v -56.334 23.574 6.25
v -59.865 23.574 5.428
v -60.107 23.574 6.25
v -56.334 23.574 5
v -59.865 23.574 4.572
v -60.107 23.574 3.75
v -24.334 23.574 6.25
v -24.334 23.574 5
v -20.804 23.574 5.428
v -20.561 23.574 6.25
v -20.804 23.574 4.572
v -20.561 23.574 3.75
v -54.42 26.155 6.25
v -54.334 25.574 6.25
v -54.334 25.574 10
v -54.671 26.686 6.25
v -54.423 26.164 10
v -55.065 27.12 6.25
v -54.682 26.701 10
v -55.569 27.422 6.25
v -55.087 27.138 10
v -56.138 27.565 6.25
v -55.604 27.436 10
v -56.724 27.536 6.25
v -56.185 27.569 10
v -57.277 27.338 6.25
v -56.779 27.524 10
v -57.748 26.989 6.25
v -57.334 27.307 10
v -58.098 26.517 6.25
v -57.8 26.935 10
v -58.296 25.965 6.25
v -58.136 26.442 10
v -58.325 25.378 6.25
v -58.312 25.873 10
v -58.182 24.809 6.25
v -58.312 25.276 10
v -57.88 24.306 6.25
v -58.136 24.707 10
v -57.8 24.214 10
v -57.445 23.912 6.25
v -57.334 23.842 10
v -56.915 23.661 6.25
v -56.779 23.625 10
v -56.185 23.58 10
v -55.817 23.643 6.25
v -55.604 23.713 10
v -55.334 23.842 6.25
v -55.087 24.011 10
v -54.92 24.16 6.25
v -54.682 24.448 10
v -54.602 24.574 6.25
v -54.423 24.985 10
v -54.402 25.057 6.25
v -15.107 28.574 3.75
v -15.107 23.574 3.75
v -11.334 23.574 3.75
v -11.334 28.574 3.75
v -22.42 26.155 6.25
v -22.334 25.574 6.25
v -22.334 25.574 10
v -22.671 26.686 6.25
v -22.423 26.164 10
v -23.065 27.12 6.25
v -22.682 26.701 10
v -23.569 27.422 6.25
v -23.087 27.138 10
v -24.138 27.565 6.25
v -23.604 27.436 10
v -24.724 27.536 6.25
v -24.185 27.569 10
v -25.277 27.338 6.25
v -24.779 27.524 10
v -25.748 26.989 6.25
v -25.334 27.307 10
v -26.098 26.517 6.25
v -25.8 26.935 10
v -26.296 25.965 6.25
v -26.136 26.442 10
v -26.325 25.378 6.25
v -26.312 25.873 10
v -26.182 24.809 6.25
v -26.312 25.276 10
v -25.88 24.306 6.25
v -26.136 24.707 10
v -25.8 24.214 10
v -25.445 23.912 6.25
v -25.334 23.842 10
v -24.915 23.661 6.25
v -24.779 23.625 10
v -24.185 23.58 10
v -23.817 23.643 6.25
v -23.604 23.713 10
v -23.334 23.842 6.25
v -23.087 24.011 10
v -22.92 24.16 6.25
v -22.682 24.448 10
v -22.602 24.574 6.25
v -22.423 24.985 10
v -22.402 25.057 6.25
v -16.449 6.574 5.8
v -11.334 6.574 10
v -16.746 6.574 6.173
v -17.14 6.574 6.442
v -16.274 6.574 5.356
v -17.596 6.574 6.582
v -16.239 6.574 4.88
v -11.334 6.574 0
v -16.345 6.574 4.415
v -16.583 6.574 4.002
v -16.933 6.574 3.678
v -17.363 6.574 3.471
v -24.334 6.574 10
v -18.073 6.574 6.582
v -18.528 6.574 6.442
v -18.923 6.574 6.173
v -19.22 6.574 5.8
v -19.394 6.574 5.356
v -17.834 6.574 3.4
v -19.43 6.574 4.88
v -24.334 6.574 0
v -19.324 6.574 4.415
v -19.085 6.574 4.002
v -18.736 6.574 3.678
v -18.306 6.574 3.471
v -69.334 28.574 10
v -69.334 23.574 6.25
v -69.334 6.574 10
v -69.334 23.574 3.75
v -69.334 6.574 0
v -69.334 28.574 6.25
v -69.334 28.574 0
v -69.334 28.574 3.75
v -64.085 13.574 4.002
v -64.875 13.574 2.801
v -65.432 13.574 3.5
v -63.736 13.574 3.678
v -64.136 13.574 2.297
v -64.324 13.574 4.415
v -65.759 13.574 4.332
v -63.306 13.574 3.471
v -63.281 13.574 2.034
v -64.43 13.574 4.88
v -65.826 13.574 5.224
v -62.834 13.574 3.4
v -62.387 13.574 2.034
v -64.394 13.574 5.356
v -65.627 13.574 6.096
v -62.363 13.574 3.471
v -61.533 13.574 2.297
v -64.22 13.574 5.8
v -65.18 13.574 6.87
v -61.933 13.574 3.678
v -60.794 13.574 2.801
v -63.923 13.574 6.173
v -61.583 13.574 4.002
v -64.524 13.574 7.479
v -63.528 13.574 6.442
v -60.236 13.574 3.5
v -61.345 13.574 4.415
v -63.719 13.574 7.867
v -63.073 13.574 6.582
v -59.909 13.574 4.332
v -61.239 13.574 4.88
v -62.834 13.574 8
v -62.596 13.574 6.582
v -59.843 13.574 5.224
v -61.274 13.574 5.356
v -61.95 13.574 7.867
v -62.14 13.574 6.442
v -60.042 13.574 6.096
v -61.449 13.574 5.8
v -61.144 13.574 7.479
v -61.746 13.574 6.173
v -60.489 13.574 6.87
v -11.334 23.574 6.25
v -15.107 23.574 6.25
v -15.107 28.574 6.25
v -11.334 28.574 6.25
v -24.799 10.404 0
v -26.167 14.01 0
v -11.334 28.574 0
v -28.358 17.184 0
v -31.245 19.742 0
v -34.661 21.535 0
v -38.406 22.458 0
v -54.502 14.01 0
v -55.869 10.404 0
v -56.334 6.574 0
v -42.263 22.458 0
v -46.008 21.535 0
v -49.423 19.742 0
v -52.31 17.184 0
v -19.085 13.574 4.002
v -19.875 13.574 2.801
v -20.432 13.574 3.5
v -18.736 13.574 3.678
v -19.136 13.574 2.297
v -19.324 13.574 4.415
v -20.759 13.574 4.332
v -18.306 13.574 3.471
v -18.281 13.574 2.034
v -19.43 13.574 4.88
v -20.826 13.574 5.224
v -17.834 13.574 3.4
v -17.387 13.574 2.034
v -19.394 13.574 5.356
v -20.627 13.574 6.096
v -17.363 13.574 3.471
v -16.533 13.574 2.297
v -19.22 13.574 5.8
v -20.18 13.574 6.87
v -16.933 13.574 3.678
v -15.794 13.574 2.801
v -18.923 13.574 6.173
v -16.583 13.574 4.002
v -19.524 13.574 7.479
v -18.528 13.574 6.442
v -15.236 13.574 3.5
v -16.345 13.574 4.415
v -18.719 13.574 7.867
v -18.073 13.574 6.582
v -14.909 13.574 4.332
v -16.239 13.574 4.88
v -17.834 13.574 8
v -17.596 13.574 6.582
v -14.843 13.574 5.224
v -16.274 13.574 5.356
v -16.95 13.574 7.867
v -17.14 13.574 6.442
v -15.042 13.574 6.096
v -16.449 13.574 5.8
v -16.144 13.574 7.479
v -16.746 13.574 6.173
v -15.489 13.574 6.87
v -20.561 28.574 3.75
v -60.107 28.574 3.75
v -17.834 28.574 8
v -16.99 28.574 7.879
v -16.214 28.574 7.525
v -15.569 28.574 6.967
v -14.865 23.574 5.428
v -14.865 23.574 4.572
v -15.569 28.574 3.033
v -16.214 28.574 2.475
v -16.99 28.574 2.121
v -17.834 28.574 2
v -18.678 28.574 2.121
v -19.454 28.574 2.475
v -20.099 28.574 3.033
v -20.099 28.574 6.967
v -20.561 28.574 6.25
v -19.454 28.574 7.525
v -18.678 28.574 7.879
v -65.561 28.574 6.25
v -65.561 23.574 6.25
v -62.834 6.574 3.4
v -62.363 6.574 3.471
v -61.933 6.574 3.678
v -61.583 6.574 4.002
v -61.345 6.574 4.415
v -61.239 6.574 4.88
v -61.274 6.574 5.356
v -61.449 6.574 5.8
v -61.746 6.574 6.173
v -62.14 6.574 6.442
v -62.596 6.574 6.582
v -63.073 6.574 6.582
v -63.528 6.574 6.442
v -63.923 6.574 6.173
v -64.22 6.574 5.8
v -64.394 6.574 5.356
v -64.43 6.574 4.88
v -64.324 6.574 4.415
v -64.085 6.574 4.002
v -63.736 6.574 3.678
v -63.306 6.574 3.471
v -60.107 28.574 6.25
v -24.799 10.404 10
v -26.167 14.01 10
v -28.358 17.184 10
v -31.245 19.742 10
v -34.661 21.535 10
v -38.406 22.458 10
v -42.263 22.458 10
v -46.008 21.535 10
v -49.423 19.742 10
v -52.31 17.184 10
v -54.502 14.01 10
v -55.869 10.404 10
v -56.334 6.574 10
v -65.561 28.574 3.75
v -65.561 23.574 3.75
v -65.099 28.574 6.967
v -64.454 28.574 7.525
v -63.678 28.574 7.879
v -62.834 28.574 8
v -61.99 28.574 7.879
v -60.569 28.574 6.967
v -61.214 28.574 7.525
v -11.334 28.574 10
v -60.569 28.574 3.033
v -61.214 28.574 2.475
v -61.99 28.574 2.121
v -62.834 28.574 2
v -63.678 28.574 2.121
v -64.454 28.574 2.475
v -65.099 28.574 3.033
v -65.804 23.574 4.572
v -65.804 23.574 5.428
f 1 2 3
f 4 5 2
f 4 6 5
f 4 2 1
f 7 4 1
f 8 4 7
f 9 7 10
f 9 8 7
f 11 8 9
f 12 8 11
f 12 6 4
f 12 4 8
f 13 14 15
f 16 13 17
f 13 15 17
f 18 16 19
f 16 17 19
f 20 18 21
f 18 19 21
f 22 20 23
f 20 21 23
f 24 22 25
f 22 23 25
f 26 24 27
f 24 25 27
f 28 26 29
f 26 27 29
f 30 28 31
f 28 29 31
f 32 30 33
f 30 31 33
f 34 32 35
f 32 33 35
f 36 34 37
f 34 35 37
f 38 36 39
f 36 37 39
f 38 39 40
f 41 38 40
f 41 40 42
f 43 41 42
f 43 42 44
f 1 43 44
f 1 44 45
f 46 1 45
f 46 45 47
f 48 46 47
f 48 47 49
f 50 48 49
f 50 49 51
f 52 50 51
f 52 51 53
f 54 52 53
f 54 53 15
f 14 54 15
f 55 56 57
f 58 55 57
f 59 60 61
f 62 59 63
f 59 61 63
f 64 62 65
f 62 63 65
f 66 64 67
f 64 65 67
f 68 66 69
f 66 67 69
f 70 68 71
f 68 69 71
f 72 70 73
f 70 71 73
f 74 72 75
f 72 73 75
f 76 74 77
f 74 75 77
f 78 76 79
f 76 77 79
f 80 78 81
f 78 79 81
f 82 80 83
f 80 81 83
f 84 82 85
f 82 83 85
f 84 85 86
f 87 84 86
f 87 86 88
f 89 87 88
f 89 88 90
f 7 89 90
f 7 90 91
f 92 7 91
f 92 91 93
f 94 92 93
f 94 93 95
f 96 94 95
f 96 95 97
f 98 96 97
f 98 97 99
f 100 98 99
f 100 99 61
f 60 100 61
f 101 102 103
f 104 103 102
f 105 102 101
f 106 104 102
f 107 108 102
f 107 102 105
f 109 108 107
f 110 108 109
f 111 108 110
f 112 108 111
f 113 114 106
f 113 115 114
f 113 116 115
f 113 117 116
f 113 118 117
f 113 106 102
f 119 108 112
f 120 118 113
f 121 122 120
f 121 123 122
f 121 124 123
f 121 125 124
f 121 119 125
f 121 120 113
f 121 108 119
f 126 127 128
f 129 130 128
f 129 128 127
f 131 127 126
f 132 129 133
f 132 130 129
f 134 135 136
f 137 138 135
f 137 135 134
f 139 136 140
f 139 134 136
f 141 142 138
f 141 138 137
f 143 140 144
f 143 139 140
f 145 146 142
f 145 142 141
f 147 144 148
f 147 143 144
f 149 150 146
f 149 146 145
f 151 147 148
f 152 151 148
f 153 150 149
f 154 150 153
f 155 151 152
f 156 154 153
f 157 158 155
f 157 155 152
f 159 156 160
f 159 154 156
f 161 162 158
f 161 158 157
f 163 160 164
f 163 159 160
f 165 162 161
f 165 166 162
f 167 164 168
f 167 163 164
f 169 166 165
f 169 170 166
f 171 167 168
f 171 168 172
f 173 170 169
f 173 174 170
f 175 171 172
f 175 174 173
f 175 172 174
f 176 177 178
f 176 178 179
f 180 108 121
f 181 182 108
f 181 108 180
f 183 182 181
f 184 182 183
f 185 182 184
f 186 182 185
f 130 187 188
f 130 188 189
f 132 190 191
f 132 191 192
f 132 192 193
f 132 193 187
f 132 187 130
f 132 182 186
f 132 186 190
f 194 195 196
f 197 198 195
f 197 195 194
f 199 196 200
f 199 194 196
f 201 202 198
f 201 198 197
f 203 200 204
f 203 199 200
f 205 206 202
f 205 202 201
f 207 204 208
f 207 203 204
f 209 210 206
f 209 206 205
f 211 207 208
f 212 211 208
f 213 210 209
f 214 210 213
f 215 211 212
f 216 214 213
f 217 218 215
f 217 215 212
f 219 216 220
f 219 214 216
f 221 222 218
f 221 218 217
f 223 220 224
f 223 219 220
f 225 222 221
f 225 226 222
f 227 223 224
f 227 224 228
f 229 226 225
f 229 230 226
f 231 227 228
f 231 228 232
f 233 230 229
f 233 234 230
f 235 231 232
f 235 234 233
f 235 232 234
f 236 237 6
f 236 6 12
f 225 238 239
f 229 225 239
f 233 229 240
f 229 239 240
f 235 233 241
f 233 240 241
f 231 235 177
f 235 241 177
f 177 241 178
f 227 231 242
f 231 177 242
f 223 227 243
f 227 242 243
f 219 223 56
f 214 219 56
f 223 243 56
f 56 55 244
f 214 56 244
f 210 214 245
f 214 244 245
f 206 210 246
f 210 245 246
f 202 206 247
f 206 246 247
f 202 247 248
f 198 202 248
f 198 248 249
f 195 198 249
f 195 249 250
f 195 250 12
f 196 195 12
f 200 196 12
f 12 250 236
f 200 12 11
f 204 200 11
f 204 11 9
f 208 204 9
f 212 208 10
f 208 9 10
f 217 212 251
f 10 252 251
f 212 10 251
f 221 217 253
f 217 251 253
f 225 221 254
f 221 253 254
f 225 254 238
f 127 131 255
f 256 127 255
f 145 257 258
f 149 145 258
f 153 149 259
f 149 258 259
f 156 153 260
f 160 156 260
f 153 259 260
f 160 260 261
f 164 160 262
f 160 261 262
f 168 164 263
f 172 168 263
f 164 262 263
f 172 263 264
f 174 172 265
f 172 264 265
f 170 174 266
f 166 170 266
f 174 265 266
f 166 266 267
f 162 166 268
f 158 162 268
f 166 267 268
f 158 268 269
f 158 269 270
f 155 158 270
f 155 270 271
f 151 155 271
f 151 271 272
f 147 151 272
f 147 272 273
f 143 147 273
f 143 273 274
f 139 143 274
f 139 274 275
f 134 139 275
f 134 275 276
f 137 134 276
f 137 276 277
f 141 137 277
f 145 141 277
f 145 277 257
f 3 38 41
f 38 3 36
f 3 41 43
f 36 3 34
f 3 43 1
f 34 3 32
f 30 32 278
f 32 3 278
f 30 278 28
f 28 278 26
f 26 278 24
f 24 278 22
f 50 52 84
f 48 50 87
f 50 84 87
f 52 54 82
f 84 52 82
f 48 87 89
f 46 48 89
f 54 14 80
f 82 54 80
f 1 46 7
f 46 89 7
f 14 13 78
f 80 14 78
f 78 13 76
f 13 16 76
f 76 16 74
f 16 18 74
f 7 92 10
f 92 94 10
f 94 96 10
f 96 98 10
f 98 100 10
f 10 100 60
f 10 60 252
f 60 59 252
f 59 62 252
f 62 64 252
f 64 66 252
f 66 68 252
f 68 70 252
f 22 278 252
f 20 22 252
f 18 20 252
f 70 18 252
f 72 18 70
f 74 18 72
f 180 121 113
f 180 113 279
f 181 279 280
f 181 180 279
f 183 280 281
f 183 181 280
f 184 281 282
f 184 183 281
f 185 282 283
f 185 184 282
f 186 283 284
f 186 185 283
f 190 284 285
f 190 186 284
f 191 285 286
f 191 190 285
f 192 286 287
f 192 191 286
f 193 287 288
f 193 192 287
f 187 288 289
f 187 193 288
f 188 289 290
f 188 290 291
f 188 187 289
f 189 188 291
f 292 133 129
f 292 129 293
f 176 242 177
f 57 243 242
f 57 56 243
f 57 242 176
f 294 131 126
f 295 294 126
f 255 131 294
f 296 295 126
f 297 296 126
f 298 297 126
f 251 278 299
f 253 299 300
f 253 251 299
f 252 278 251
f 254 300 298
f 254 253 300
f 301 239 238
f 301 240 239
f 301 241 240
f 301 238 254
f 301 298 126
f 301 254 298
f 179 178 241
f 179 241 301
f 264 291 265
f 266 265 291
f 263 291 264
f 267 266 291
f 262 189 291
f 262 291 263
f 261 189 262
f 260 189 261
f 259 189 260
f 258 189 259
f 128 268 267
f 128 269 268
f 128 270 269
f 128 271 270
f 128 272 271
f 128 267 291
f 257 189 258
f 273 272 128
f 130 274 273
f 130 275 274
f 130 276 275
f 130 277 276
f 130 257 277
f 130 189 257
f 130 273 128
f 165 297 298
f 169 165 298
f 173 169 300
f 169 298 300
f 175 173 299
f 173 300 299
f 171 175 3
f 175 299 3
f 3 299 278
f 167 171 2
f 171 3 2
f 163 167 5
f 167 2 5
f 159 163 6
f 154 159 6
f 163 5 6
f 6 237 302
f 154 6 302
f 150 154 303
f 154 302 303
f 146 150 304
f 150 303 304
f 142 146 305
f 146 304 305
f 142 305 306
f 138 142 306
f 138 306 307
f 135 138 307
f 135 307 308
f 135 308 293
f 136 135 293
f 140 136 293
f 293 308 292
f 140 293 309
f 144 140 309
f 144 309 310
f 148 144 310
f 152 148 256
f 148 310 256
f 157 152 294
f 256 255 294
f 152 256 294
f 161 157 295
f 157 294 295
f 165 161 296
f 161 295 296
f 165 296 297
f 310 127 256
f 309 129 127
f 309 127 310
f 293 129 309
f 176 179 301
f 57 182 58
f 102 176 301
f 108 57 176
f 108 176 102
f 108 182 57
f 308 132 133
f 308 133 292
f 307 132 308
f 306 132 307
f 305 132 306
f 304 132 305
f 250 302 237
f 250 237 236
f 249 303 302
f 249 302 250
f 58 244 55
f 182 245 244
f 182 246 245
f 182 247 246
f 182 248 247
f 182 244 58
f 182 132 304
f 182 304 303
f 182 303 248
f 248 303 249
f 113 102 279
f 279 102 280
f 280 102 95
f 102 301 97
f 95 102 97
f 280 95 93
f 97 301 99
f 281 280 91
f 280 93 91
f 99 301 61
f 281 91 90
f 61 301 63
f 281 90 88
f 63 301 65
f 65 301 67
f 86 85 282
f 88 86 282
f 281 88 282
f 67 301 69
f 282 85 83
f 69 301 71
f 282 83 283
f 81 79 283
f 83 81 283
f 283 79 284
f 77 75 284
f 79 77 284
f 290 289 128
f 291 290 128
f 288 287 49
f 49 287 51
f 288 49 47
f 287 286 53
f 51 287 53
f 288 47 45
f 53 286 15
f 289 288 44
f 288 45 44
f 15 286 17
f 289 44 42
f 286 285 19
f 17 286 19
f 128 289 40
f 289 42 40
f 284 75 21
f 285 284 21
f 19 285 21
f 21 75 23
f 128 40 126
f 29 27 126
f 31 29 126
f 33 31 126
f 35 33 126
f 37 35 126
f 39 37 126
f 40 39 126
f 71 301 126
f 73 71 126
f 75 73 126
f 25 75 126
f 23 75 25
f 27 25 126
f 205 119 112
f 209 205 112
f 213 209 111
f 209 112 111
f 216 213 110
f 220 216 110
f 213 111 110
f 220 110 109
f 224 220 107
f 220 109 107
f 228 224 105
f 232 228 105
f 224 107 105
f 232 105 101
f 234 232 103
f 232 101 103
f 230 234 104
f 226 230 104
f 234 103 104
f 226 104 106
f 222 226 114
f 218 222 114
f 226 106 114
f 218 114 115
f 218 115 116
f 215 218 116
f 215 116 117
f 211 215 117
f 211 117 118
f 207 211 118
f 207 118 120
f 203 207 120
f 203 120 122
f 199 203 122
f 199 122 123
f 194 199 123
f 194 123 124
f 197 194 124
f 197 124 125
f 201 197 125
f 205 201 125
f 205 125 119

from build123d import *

# Parameters (mm, degrees)
EXTRUDE_1_DEPTH     = 10
SKETCH_2_R          = 1.6
CUT_EXTRUDE_1_DEPTH = 27
SKETCH_3_R          = 3
CUT_EXTRUDE_2_DEPTH = 15
SKETCH_4_W          = 58
SKETCH_4_H          = 2.5
CUT_EXTRUDE_4_DEPTH = 5
SKETCH_5_R          = 2
CUT_EXTRUDE_5_DEPTH = 5


with BuildPart() as part:
    # 草图1 → 凸台-拉伸1 (new body)
    with BuildSketch(Plane.XY):
        with BuildLine():
            Line((-69.33427814, 6.574466706), (-69.33427814, 28.574466706))
            Line((-69.33427814, 28.574466706), (-11.33427814, 28.574466706))
            Line((-11.33427814, 28.574466706), (-11.33427814, 6.574466706))
            Line((-11.33427814, 6.574466706), (-24.33427814, 6.574466706))
            ThreePointArc((-24.33427814, 6.574466706), (-40.33427814, 22.574466706), (-56.33427814, 6.574466706))
            Line((-56.33427814, 6.574466706), (-69.33427814, 6.574466706))
        make_face()
    extrude(amount=EXTRUDE_1_DEPTH)

    # 草图2 → 切除-拉伸1 (cut)
    with BuildSketch(Plane.XZ.offset(-6.574466706)):
        with Locations(Location((-62.83427814, 5, 0), (0, 0, 270))):
            Circle(SKETCH_2_R)
        with Locations(Location((-17.83427814, 5, 0), (0, 0, 270))):
            Circle(SKETCH_2_R)
    extrude(amount=-CUT_EXTRUDE_1_DEPTH, mode=Mode.SUBTRACT)

    # 草图3 → 切除-拉伸2 (cut)
    with BuildSketch(Plane(origin=(0, 28.574466706, 0), x_dir=(1, 0, 0), z_dir=(0, 1, 0))):
        with Locations(Location((-62.83427814, -5, 0), (0, 0, 270))):
            Circle(SKETCH_3_R)
        with Locations(Location((-17.83427814, -5, 0), (0, 0, 270))):
            Circle(SKETCH_3_R)
    extrude(amount=-CUT_EXTRUDE_2_DEPTH, mode=Mode.SUBTRACT)

    # 草图4 → 切除-拉伸4 (cut)
    with BuildSketch(Plane(origin=(0, 28.574466706, 0), x_dir=(1, 0, 0), z_dir=(0, 1, 0))):
        with Locations((-40.33427814, -5)):
            Rectangle(SKETCH_4_W, SKETCH_4_H)
    extrude(amount=-CUT_EXTRUDE_4_DEPTH, mode=Mode.SUBTRACT)

    # 草图5 → 切除-拉伸5 (cut)
    with BuildSketch(Plane.XY.offset(10)):
        with Locations((-56.33427814, 25.574466706)):
            Circle(SKETCH_5_R)
        with Locations((-24.33427814, 25.574466706)):
            Circle(SKETCH_5_R)
    extrude(amount=-CUT_EXTRUDE_5_DEPTH, mode=Mode.SUBTRACT)


solid = part.part
